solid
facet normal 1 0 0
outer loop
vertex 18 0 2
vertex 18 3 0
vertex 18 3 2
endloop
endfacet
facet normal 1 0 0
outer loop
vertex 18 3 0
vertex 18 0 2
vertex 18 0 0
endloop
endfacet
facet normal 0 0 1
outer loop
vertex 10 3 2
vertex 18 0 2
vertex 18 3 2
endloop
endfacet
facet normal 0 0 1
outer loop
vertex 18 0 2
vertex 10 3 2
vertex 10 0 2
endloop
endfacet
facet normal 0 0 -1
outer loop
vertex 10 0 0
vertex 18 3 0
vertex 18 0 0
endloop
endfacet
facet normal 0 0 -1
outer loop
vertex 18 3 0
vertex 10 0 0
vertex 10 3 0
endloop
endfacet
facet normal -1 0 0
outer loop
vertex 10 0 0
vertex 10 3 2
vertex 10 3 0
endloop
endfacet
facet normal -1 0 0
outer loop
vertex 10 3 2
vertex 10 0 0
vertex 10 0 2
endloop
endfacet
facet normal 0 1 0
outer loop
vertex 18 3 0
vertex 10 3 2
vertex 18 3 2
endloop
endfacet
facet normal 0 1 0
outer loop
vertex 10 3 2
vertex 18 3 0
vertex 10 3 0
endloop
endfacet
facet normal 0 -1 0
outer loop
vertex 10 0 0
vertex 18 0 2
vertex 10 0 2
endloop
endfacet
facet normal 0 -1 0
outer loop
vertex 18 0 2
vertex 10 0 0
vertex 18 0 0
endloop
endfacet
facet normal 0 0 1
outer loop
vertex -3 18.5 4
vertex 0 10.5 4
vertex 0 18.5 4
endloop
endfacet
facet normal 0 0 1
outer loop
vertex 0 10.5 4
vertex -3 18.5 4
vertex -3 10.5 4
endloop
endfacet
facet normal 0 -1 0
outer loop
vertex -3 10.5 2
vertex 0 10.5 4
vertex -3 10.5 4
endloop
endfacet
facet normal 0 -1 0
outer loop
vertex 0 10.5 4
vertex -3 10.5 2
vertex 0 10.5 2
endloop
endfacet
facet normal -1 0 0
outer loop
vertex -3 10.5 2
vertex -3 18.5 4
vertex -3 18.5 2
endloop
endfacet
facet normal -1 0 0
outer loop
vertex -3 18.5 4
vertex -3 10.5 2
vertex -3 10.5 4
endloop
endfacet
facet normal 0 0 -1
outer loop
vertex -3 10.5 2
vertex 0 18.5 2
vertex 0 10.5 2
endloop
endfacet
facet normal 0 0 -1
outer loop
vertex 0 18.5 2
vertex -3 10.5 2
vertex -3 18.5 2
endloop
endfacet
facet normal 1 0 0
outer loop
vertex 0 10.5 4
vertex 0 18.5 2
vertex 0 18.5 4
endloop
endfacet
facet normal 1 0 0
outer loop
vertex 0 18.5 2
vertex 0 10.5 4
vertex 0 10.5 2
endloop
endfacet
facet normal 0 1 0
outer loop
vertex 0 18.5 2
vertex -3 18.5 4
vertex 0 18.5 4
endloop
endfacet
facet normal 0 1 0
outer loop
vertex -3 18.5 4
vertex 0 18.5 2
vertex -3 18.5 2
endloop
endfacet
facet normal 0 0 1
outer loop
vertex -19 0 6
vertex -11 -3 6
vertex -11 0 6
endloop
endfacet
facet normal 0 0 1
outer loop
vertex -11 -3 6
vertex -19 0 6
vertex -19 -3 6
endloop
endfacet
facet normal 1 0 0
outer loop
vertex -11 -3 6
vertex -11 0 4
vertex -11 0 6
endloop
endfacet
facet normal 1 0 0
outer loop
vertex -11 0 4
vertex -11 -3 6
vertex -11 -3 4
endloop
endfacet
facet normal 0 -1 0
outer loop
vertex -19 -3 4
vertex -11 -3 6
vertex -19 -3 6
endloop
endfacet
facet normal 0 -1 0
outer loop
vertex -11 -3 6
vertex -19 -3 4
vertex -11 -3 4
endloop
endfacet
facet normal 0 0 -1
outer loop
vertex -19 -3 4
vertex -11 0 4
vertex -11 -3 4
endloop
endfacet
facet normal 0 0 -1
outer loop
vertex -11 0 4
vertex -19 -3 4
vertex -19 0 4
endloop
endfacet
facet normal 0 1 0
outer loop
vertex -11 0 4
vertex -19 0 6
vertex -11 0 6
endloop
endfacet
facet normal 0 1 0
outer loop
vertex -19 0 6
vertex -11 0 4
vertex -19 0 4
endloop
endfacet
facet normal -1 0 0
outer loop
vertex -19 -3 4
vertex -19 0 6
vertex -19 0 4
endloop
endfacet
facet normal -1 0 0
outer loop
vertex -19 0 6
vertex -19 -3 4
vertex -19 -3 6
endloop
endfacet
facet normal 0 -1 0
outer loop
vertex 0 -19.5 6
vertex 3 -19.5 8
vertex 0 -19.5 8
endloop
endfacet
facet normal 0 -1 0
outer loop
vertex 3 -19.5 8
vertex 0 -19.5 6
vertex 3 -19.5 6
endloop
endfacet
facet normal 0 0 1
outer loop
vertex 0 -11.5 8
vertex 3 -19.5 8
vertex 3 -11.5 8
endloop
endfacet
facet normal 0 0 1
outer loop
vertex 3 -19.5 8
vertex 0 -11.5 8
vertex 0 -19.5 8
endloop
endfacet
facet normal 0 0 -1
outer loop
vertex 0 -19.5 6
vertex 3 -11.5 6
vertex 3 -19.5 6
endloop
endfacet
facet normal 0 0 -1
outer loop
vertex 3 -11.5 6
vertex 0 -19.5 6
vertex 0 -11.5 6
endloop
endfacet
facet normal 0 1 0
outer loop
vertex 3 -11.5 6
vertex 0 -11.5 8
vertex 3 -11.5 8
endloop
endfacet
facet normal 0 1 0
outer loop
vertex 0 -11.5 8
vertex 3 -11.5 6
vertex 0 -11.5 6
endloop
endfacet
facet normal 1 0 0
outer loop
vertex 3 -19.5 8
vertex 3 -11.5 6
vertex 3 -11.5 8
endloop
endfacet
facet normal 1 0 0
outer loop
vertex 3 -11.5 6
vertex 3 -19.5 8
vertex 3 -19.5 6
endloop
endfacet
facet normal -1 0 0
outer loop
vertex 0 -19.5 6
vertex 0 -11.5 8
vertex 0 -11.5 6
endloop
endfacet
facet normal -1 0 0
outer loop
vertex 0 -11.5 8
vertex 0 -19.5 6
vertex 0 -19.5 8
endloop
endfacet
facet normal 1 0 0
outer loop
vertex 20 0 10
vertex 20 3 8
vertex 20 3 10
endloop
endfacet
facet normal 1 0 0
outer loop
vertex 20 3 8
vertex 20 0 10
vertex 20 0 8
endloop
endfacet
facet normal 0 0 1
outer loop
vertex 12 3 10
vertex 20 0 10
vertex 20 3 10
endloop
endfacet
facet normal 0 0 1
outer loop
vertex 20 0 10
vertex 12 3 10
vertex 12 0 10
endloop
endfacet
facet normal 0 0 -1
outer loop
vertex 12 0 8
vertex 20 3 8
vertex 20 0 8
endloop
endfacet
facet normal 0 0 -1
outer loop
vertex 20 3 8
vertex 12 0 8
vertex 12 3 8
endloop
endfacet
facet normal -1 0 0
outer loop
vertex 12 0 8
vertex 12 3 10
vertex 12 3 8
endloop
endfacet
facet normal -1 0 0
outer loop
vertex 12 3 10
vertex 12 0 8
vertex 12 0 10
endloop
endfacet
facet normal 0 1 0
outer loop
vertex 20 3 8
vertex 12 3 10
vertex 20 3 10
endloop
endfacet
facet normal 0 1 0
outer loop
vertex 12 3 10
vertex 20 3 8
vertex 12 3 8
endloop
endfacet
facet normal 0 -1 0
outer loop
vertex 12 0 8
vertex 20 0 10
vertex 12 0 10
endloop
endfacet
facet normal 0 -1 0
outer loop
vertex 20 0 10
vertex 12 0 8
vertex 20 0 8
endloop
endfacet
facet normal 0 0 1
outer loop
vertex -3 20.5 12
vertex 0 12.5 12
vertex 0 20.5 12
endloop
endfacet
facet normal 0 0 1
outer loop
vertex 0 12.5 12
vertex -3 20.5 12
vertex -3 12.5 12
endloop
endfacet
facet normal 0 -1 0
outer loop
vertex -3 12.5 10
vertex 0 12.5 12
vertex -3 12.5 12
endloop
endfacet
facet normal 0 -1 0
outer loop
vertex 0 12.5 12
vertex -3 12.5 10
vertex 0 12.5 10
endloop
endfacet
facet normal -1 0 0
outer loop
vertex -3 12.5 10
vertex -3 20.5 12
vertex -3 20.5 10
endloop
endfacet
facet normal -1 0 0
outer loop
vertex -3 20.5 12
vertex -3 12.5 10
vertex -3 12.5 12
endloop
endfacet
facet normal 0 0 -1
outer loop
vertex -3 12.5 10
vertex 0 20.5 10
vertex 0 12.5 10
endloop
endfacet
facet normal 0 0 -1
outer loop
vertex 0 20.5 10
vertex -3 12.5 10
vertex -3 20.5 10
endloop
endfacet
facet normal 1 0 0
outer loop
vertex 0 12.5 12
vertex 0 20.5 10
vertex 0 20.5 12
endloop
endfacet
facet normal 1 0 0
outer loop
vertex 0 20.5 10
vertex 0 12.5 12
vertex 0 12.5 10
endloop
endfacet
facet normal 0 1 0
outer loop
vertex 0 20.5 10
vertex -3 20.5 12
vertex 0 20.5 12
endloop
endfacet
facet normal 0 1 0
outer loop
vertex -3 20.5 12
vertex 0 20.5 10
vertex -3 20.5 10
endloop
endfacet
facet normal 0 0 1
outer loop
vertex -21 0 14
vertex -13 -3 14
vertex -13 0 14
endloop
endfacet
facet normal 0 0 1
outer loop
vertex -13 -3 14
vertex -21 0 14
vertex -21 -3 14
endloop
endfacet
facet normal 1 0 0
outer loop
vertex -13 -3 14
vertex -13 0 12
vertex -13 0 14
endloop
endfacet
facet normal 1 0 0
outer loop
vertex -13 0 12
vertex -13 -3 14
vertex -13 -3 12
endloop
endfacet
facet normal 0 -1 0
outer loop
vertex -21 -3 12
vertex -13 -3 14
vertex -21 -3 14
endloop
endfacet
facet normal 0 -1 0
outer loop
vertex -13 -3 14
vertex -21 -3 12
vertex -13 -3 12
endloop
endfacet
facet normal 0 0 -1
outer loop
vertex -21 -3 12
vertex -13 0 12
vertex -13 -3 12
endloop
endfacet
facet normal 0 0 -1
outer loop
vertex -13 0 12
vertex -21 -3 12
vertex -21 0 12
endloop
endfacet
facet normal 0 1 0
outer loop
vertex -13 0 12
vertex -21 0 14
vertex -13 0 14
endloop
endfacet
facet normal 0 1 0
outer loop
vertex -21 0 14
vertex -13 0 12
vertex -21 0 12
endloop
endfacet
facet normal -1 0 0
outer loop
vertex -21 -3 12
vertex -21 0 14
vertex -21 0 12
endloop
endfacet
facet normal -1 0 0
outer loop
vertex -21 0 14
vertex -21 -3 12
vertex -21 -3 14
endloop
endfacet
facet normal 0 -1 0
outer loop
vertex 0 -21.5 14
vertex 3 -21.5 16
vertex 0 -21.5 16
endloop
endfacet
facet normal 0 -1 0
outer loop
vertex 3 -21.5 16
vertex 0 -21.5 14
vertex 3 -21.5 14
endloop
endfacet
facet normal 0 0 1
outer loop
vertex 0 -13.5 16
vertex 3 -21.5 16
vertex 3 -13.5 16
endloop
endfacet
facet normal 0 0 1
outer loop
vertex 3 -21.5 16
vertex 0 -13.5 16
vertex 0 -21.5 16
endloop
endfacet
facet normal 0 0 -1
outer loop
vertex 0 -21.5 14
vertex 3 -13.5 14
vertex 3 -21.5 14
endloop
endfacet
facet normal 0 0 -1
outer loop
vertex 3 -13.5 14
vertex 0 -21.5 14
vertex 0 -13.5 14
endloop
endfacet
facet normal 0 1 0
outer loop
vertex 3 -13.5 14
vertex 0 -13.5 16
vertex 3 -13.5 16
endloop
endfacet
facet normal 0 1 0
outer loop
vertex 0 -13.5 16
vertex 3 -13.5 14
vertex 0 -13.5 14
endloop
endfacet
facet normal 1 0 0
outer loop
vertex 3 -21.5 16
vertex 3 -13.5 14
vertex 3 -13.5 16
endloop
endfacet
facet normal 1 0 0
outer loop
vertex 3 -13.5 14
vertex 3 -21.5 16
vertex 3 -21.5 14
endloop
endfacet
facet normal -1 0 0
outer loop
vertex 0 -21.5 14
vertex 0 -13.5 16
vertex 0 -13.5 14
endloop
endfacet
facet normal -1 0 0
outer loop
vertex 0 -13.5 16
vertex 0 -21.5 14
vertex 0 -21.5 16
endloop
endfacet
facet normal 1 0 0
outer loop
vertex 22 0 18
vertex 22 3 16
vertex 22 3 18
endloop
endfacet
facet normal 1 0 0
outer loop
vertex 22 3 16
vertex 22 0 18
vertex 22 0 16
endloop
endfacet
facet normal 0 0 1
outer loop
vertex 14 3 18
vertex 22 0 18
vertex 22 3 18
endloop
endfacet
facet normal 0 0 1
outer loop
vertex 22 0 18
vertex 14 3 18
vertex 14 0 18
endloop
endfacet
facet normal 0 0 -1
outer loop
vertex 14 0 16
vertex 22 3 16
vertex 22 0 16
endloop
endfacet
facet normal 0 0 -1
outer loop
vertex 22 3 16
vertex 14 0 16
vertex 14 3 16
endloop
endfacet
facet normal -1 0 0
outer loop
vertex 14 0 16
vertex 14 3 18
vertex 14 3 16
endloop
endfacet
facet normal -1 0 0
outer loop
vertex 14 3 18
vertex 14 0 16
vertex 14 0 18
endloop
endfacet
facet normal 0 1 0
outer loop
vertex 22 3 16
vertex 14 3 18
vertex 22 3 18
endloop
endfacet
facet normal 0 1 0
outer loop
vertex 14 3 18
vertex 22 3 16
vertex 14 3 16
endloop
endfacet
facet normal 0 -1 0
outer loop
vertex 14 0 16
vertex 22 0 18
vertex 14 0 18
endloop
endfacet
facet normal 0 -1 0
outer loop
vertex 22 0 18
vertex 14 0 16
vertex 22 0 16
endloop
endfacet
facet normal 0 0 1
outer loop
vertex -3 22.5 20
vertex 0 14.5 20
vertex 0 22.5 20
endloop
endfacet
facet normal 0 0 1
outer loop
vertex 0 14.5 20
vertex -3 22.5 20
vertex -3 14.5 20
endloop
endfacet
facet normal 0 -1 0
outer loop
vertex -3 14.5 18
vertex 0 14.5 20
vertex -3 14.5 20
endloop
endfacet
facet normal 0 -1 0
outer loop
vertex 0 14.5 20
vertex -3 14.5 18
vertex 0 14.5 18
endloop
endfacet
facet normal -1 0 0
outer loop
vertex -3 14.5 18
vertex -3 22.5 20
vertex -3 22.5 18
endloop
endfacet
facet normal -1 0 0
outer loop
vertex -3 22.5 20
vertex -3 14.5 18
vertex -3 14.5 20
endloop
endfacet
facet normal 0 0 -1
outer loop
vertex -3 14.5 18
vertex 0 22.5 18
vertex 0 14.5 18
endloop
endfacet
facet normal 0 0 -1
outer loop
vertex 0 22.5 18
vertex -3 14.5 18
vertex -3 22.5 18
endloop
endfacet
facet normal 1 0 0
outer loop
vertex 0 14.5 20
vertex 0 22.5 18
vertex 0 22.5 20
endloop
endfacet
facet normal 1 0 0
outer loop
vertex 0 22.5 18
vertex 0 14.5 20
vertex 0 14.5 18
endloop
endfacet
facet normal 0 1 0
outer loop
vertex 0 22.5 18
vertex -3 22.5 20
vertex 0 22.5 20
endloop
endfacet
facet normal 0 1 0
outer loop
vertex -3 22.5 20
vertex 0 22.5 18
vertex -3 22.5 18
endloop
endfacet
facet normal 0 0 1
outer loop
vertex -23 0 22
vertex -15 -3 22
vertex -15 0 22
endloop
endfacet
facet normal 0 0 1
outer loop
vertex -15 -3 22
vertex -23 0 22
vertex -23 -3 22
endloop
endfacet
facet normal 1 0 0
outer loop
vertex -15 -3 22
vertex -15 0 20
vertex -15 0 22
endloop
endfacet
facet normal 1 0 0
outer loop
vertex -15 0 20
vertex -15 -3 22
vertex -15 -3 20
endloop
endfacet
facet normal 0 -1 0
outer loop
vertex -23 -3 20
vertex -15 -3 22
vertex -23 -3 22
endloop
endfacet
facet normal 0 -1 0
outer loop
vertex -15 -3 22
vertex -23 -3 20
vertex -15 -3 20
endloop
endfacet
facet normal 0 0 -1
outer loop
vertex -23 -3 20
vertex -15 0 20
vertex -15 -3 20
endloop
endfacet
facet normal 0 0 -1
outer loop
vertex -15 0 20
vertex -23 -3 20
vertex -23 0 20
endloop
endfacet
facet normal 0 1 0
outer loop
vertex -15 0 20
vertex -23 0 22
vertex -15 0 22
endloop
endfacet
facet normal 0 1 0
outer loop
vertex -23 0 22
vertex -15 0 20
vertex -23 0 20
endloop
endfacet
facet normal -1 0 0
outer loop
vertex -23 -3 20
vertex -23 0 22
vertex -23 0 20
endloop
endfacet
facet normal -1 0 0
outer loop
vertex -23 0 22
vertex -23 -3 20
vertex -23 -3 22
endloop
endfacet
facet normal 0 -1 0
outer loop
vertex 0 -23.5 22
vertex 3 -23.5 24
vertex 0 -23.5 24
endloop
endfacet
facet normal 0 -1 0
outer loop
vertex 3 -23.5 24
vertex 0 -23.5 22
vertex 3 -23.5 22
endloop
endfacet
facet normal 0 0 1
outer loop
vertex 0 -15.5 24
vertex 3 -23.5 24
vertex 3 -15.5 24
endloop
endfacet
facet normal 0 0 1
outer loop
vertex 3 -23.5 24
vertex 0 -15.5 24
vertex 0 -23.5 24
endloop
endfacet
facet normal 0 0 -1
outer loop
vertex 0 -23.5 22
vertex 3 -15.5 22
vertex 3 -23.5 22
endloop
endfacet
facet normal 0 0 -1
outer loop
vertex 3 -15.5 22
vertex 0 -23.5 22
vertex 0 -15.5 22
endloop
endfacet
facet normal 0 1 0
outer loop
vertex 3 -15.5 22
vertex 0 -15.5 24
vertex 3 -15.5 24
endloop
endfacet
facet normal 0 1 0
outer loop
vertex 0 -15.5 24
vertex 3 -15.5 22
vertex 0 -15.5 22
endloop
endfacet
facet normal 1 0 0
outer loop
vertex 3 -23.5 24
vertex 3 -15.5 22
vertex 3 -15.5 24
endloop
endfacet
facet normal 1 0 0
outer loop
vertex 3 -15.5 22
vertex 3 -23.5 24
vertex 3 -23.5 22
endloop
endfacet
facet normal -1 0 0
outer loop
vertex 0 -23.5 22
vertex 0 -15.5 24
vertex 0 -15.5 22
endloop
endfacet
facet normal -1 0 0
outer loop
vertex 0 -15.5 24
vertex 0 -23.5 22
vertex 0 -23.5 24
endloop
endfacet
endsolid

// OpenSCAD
// Example: Spiral Platform
$fn=64;
n=12; h=2;
for (i=[0:n-1]) {
    rotate([0,0,i*360/n*3])
        translate([10+i*0.5,0,i*h])
            cube([8, 3, h]);
}
